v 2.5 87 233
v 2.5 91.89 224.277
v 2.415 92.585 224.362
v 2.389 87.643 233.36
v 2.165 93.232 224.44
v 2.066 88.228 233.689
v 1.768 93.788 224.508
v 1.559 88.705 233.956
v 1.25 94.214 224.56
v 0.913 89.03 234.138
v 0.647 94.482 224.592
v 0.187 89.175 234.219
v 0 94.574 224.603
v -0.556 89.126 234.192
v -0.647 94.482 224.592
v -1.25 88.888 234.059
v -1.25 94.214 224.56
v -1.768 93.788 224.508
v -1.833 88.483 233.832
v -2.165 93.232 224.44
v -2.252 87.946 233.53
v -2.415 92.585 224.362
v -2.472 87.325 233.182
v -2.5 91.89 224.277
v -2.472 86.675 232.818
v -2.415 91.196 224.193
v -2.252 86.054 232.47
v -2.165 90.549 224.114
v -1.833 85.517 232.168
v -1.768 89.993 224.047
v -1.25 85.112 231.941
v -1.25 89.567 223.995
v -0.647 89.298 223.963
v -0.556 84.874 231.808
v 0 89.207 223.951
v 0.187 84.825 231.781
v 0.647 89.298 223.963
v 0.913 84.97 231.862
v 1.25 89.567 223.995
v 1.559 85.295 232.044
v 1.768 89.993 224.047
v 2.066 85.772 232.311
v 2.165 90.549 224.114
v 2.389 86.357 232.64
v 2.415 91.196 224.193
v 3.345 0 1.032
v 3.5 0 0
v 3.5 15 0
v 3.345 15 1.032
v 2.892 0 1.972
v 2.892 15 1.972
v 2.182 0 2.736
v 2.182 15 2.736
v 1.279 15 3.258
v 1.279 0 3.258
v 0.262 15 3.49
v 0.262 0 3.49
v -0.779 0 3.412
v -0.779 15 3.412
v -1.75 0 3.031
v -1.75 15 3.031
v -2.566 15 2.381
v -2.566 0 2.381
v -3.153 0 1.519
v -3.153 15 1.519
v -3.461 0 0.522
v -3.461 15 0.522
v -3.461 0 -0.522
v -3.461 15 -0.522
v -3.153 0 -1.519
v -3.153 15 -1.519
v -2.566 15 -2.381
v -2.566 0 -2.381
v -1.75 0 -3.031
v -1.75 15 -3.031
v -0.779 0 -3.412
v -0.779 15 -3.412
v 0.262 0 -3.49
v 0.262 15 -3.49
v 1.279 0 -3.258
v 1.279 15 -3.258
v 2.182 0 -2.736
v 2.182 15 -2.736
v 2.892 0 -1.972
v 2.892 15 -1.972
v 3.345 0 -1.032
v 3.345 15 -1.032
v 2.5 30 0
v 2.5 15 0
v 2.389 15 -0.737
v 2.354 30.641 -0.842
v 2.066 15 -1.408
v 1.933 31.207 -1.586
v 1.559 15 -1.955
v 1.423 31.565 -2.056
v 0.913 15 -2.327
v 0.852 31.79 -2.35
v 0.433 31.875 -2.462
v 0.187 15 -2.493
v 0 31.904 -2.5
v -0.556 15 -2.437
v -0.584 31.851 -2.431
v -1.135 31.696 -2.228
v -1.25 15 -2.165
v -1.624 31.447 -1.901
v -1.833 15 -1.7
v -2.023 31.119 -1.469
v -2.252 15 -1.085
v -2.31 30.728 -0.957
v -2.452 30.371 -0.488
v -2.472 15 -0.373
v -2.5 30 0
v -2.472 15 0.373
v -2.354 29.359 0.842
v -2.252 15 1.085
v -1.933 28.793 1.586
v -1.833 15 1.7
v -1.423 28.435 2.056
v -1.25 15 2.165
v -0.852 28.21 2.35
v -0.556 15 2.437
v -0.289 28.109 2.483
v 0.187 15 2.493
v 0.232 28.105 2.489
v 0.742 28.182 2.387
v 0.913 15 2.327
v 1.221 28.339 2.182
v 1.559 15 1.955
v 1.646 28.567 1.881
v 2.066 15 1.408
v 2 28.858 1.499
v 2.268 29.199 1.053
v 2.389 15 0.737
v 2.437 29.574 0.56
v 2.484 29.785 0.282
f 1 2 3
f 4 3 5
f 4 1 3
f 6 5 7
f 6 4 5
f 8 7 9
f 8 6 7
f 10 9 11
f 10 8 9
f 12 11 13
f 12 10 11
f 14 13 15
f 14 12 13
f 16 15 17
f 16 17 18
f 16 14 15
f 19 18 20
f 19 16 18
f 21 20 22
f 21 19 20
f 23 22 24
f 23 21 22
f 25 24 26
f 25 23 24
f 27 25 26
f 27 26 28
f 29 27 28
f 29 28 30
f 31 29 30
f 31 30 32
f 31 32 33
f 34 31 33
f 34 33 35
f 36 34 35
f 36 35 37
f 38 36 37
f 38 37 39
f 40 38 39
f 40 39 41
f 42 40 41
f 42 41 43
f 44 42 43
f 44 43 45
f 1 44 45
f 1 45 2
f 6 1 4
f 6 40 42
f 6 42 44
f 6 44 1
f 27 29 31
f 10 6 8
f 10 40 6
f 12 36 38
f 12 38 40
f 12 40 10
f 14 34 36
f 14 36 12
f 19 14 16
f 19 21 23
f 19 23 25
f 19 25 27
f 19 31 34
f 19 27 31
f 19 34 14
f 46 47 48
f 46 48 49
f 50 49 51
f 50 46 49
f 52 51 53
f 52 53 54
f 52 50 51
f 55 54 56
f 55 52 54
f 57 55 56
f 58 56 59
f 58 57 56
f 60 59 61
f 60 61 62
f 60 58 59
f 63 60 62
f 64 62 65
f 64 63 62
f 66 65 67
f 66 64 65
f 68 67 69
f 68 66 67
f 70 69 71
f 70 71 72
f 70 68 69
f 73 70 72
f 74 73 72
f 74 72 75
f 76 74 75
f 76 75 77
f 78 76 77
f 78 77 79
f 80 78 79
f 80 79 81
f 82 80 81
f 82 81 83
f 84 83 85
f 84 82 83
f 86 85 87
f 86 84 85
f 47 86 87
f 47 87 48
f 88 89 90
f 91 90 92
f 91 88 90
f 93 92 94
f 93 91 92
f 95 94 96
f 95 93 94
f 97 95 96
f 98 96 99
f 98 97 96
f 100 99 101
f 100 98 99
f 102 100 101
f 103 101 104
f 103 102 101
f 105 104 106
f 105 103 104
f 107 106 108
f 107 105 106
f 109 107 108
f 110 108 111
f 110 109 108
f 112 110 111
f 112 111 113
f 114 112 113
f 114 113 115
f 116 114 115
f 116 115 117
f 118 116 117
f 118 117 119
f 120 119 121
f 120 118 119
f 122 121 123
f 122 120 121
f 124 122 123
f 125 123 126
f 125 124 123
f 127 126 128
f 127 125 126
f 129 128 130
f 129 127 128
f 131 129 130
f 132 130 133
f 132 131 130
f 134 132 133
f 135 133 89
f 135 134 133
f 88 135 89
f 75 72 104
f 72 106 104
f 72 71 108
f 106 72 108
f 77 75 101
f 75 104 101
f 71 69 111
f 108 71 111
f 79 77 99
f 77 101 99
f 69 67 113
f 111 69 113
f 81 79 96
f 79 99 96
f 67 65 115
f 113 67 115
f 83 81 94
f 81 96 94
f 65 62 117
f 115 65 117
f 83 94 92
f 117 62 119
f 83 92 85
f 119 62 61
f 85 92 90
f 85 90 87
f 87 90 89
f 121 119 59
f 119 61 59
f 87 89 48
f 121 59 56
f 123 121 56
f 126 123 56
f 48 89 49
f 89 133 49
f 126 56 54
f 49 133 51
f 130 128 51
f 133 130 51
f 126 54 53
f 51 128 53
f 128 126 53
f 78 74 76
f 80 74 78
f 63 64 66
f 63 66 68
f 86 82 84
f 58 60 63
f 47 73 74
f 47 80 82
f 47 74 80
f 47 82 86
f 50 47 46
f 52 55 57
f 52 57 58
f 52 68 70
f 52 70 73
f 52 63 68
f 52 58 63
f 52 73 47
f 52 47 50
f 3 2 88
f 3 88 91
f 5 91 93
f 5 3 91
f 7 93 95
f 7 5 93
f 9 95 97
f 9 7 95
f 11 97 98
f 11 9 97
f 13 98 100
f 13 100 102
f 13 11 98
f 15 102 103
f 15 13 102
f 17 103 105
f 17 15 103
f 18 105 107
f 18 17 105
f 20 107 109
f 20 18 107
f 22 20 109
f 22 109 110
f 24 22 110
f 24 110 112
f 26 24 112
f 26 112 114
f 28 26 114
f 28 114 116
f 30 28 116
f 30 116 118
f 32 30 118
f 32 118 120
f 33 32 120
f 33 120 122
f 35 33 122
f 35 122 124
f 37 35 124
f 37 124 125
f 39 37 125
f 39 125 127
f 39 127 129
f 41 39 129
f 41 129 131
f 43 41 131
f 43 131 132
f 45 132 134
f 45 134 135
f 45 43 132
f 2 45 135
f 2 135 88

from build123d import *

# Parameters (mm, degrees)
SKETCH2_R           = 2.5
SKETCH3_R           = 3.5
BOSS_EXTRUDE1_DEPTH = 15


with BuildPart() as part:
    # Sweep1: sweep along a path in Sketch1
    with BuildLine(Plane(origin=(0, 0, 0), x_dir=(0, 0, -1), z_dir=(1, 0, 0))) as sweep1_path:
        Line((0, 0), (0, 30))
        Line((0, 30), (-224.277396019, 91.890417139))
        Line((-224.277396019, 91.890417139), (-233, 87))
    # Sketch2 → Sweep1 (sweep)
    with BuildSketch(Plane(origin=(0, 87, 233), x_dir=(1, 0, 0), z_dir=(0, -0.489041714, 0.872260398))):
        Circle(SKETCH2_R)
    sweep(path=sweep1_path.line, transition=Transition.RIGHT)

    # Sketch3 → Boss-Extrude1 (add)
    with BuildSketch(Plane.XZ):
        Circle(SKETCH3_R)
    extrude(amount=-BOSS_EXTRUDE1_DEPTH)


solid = part.part
